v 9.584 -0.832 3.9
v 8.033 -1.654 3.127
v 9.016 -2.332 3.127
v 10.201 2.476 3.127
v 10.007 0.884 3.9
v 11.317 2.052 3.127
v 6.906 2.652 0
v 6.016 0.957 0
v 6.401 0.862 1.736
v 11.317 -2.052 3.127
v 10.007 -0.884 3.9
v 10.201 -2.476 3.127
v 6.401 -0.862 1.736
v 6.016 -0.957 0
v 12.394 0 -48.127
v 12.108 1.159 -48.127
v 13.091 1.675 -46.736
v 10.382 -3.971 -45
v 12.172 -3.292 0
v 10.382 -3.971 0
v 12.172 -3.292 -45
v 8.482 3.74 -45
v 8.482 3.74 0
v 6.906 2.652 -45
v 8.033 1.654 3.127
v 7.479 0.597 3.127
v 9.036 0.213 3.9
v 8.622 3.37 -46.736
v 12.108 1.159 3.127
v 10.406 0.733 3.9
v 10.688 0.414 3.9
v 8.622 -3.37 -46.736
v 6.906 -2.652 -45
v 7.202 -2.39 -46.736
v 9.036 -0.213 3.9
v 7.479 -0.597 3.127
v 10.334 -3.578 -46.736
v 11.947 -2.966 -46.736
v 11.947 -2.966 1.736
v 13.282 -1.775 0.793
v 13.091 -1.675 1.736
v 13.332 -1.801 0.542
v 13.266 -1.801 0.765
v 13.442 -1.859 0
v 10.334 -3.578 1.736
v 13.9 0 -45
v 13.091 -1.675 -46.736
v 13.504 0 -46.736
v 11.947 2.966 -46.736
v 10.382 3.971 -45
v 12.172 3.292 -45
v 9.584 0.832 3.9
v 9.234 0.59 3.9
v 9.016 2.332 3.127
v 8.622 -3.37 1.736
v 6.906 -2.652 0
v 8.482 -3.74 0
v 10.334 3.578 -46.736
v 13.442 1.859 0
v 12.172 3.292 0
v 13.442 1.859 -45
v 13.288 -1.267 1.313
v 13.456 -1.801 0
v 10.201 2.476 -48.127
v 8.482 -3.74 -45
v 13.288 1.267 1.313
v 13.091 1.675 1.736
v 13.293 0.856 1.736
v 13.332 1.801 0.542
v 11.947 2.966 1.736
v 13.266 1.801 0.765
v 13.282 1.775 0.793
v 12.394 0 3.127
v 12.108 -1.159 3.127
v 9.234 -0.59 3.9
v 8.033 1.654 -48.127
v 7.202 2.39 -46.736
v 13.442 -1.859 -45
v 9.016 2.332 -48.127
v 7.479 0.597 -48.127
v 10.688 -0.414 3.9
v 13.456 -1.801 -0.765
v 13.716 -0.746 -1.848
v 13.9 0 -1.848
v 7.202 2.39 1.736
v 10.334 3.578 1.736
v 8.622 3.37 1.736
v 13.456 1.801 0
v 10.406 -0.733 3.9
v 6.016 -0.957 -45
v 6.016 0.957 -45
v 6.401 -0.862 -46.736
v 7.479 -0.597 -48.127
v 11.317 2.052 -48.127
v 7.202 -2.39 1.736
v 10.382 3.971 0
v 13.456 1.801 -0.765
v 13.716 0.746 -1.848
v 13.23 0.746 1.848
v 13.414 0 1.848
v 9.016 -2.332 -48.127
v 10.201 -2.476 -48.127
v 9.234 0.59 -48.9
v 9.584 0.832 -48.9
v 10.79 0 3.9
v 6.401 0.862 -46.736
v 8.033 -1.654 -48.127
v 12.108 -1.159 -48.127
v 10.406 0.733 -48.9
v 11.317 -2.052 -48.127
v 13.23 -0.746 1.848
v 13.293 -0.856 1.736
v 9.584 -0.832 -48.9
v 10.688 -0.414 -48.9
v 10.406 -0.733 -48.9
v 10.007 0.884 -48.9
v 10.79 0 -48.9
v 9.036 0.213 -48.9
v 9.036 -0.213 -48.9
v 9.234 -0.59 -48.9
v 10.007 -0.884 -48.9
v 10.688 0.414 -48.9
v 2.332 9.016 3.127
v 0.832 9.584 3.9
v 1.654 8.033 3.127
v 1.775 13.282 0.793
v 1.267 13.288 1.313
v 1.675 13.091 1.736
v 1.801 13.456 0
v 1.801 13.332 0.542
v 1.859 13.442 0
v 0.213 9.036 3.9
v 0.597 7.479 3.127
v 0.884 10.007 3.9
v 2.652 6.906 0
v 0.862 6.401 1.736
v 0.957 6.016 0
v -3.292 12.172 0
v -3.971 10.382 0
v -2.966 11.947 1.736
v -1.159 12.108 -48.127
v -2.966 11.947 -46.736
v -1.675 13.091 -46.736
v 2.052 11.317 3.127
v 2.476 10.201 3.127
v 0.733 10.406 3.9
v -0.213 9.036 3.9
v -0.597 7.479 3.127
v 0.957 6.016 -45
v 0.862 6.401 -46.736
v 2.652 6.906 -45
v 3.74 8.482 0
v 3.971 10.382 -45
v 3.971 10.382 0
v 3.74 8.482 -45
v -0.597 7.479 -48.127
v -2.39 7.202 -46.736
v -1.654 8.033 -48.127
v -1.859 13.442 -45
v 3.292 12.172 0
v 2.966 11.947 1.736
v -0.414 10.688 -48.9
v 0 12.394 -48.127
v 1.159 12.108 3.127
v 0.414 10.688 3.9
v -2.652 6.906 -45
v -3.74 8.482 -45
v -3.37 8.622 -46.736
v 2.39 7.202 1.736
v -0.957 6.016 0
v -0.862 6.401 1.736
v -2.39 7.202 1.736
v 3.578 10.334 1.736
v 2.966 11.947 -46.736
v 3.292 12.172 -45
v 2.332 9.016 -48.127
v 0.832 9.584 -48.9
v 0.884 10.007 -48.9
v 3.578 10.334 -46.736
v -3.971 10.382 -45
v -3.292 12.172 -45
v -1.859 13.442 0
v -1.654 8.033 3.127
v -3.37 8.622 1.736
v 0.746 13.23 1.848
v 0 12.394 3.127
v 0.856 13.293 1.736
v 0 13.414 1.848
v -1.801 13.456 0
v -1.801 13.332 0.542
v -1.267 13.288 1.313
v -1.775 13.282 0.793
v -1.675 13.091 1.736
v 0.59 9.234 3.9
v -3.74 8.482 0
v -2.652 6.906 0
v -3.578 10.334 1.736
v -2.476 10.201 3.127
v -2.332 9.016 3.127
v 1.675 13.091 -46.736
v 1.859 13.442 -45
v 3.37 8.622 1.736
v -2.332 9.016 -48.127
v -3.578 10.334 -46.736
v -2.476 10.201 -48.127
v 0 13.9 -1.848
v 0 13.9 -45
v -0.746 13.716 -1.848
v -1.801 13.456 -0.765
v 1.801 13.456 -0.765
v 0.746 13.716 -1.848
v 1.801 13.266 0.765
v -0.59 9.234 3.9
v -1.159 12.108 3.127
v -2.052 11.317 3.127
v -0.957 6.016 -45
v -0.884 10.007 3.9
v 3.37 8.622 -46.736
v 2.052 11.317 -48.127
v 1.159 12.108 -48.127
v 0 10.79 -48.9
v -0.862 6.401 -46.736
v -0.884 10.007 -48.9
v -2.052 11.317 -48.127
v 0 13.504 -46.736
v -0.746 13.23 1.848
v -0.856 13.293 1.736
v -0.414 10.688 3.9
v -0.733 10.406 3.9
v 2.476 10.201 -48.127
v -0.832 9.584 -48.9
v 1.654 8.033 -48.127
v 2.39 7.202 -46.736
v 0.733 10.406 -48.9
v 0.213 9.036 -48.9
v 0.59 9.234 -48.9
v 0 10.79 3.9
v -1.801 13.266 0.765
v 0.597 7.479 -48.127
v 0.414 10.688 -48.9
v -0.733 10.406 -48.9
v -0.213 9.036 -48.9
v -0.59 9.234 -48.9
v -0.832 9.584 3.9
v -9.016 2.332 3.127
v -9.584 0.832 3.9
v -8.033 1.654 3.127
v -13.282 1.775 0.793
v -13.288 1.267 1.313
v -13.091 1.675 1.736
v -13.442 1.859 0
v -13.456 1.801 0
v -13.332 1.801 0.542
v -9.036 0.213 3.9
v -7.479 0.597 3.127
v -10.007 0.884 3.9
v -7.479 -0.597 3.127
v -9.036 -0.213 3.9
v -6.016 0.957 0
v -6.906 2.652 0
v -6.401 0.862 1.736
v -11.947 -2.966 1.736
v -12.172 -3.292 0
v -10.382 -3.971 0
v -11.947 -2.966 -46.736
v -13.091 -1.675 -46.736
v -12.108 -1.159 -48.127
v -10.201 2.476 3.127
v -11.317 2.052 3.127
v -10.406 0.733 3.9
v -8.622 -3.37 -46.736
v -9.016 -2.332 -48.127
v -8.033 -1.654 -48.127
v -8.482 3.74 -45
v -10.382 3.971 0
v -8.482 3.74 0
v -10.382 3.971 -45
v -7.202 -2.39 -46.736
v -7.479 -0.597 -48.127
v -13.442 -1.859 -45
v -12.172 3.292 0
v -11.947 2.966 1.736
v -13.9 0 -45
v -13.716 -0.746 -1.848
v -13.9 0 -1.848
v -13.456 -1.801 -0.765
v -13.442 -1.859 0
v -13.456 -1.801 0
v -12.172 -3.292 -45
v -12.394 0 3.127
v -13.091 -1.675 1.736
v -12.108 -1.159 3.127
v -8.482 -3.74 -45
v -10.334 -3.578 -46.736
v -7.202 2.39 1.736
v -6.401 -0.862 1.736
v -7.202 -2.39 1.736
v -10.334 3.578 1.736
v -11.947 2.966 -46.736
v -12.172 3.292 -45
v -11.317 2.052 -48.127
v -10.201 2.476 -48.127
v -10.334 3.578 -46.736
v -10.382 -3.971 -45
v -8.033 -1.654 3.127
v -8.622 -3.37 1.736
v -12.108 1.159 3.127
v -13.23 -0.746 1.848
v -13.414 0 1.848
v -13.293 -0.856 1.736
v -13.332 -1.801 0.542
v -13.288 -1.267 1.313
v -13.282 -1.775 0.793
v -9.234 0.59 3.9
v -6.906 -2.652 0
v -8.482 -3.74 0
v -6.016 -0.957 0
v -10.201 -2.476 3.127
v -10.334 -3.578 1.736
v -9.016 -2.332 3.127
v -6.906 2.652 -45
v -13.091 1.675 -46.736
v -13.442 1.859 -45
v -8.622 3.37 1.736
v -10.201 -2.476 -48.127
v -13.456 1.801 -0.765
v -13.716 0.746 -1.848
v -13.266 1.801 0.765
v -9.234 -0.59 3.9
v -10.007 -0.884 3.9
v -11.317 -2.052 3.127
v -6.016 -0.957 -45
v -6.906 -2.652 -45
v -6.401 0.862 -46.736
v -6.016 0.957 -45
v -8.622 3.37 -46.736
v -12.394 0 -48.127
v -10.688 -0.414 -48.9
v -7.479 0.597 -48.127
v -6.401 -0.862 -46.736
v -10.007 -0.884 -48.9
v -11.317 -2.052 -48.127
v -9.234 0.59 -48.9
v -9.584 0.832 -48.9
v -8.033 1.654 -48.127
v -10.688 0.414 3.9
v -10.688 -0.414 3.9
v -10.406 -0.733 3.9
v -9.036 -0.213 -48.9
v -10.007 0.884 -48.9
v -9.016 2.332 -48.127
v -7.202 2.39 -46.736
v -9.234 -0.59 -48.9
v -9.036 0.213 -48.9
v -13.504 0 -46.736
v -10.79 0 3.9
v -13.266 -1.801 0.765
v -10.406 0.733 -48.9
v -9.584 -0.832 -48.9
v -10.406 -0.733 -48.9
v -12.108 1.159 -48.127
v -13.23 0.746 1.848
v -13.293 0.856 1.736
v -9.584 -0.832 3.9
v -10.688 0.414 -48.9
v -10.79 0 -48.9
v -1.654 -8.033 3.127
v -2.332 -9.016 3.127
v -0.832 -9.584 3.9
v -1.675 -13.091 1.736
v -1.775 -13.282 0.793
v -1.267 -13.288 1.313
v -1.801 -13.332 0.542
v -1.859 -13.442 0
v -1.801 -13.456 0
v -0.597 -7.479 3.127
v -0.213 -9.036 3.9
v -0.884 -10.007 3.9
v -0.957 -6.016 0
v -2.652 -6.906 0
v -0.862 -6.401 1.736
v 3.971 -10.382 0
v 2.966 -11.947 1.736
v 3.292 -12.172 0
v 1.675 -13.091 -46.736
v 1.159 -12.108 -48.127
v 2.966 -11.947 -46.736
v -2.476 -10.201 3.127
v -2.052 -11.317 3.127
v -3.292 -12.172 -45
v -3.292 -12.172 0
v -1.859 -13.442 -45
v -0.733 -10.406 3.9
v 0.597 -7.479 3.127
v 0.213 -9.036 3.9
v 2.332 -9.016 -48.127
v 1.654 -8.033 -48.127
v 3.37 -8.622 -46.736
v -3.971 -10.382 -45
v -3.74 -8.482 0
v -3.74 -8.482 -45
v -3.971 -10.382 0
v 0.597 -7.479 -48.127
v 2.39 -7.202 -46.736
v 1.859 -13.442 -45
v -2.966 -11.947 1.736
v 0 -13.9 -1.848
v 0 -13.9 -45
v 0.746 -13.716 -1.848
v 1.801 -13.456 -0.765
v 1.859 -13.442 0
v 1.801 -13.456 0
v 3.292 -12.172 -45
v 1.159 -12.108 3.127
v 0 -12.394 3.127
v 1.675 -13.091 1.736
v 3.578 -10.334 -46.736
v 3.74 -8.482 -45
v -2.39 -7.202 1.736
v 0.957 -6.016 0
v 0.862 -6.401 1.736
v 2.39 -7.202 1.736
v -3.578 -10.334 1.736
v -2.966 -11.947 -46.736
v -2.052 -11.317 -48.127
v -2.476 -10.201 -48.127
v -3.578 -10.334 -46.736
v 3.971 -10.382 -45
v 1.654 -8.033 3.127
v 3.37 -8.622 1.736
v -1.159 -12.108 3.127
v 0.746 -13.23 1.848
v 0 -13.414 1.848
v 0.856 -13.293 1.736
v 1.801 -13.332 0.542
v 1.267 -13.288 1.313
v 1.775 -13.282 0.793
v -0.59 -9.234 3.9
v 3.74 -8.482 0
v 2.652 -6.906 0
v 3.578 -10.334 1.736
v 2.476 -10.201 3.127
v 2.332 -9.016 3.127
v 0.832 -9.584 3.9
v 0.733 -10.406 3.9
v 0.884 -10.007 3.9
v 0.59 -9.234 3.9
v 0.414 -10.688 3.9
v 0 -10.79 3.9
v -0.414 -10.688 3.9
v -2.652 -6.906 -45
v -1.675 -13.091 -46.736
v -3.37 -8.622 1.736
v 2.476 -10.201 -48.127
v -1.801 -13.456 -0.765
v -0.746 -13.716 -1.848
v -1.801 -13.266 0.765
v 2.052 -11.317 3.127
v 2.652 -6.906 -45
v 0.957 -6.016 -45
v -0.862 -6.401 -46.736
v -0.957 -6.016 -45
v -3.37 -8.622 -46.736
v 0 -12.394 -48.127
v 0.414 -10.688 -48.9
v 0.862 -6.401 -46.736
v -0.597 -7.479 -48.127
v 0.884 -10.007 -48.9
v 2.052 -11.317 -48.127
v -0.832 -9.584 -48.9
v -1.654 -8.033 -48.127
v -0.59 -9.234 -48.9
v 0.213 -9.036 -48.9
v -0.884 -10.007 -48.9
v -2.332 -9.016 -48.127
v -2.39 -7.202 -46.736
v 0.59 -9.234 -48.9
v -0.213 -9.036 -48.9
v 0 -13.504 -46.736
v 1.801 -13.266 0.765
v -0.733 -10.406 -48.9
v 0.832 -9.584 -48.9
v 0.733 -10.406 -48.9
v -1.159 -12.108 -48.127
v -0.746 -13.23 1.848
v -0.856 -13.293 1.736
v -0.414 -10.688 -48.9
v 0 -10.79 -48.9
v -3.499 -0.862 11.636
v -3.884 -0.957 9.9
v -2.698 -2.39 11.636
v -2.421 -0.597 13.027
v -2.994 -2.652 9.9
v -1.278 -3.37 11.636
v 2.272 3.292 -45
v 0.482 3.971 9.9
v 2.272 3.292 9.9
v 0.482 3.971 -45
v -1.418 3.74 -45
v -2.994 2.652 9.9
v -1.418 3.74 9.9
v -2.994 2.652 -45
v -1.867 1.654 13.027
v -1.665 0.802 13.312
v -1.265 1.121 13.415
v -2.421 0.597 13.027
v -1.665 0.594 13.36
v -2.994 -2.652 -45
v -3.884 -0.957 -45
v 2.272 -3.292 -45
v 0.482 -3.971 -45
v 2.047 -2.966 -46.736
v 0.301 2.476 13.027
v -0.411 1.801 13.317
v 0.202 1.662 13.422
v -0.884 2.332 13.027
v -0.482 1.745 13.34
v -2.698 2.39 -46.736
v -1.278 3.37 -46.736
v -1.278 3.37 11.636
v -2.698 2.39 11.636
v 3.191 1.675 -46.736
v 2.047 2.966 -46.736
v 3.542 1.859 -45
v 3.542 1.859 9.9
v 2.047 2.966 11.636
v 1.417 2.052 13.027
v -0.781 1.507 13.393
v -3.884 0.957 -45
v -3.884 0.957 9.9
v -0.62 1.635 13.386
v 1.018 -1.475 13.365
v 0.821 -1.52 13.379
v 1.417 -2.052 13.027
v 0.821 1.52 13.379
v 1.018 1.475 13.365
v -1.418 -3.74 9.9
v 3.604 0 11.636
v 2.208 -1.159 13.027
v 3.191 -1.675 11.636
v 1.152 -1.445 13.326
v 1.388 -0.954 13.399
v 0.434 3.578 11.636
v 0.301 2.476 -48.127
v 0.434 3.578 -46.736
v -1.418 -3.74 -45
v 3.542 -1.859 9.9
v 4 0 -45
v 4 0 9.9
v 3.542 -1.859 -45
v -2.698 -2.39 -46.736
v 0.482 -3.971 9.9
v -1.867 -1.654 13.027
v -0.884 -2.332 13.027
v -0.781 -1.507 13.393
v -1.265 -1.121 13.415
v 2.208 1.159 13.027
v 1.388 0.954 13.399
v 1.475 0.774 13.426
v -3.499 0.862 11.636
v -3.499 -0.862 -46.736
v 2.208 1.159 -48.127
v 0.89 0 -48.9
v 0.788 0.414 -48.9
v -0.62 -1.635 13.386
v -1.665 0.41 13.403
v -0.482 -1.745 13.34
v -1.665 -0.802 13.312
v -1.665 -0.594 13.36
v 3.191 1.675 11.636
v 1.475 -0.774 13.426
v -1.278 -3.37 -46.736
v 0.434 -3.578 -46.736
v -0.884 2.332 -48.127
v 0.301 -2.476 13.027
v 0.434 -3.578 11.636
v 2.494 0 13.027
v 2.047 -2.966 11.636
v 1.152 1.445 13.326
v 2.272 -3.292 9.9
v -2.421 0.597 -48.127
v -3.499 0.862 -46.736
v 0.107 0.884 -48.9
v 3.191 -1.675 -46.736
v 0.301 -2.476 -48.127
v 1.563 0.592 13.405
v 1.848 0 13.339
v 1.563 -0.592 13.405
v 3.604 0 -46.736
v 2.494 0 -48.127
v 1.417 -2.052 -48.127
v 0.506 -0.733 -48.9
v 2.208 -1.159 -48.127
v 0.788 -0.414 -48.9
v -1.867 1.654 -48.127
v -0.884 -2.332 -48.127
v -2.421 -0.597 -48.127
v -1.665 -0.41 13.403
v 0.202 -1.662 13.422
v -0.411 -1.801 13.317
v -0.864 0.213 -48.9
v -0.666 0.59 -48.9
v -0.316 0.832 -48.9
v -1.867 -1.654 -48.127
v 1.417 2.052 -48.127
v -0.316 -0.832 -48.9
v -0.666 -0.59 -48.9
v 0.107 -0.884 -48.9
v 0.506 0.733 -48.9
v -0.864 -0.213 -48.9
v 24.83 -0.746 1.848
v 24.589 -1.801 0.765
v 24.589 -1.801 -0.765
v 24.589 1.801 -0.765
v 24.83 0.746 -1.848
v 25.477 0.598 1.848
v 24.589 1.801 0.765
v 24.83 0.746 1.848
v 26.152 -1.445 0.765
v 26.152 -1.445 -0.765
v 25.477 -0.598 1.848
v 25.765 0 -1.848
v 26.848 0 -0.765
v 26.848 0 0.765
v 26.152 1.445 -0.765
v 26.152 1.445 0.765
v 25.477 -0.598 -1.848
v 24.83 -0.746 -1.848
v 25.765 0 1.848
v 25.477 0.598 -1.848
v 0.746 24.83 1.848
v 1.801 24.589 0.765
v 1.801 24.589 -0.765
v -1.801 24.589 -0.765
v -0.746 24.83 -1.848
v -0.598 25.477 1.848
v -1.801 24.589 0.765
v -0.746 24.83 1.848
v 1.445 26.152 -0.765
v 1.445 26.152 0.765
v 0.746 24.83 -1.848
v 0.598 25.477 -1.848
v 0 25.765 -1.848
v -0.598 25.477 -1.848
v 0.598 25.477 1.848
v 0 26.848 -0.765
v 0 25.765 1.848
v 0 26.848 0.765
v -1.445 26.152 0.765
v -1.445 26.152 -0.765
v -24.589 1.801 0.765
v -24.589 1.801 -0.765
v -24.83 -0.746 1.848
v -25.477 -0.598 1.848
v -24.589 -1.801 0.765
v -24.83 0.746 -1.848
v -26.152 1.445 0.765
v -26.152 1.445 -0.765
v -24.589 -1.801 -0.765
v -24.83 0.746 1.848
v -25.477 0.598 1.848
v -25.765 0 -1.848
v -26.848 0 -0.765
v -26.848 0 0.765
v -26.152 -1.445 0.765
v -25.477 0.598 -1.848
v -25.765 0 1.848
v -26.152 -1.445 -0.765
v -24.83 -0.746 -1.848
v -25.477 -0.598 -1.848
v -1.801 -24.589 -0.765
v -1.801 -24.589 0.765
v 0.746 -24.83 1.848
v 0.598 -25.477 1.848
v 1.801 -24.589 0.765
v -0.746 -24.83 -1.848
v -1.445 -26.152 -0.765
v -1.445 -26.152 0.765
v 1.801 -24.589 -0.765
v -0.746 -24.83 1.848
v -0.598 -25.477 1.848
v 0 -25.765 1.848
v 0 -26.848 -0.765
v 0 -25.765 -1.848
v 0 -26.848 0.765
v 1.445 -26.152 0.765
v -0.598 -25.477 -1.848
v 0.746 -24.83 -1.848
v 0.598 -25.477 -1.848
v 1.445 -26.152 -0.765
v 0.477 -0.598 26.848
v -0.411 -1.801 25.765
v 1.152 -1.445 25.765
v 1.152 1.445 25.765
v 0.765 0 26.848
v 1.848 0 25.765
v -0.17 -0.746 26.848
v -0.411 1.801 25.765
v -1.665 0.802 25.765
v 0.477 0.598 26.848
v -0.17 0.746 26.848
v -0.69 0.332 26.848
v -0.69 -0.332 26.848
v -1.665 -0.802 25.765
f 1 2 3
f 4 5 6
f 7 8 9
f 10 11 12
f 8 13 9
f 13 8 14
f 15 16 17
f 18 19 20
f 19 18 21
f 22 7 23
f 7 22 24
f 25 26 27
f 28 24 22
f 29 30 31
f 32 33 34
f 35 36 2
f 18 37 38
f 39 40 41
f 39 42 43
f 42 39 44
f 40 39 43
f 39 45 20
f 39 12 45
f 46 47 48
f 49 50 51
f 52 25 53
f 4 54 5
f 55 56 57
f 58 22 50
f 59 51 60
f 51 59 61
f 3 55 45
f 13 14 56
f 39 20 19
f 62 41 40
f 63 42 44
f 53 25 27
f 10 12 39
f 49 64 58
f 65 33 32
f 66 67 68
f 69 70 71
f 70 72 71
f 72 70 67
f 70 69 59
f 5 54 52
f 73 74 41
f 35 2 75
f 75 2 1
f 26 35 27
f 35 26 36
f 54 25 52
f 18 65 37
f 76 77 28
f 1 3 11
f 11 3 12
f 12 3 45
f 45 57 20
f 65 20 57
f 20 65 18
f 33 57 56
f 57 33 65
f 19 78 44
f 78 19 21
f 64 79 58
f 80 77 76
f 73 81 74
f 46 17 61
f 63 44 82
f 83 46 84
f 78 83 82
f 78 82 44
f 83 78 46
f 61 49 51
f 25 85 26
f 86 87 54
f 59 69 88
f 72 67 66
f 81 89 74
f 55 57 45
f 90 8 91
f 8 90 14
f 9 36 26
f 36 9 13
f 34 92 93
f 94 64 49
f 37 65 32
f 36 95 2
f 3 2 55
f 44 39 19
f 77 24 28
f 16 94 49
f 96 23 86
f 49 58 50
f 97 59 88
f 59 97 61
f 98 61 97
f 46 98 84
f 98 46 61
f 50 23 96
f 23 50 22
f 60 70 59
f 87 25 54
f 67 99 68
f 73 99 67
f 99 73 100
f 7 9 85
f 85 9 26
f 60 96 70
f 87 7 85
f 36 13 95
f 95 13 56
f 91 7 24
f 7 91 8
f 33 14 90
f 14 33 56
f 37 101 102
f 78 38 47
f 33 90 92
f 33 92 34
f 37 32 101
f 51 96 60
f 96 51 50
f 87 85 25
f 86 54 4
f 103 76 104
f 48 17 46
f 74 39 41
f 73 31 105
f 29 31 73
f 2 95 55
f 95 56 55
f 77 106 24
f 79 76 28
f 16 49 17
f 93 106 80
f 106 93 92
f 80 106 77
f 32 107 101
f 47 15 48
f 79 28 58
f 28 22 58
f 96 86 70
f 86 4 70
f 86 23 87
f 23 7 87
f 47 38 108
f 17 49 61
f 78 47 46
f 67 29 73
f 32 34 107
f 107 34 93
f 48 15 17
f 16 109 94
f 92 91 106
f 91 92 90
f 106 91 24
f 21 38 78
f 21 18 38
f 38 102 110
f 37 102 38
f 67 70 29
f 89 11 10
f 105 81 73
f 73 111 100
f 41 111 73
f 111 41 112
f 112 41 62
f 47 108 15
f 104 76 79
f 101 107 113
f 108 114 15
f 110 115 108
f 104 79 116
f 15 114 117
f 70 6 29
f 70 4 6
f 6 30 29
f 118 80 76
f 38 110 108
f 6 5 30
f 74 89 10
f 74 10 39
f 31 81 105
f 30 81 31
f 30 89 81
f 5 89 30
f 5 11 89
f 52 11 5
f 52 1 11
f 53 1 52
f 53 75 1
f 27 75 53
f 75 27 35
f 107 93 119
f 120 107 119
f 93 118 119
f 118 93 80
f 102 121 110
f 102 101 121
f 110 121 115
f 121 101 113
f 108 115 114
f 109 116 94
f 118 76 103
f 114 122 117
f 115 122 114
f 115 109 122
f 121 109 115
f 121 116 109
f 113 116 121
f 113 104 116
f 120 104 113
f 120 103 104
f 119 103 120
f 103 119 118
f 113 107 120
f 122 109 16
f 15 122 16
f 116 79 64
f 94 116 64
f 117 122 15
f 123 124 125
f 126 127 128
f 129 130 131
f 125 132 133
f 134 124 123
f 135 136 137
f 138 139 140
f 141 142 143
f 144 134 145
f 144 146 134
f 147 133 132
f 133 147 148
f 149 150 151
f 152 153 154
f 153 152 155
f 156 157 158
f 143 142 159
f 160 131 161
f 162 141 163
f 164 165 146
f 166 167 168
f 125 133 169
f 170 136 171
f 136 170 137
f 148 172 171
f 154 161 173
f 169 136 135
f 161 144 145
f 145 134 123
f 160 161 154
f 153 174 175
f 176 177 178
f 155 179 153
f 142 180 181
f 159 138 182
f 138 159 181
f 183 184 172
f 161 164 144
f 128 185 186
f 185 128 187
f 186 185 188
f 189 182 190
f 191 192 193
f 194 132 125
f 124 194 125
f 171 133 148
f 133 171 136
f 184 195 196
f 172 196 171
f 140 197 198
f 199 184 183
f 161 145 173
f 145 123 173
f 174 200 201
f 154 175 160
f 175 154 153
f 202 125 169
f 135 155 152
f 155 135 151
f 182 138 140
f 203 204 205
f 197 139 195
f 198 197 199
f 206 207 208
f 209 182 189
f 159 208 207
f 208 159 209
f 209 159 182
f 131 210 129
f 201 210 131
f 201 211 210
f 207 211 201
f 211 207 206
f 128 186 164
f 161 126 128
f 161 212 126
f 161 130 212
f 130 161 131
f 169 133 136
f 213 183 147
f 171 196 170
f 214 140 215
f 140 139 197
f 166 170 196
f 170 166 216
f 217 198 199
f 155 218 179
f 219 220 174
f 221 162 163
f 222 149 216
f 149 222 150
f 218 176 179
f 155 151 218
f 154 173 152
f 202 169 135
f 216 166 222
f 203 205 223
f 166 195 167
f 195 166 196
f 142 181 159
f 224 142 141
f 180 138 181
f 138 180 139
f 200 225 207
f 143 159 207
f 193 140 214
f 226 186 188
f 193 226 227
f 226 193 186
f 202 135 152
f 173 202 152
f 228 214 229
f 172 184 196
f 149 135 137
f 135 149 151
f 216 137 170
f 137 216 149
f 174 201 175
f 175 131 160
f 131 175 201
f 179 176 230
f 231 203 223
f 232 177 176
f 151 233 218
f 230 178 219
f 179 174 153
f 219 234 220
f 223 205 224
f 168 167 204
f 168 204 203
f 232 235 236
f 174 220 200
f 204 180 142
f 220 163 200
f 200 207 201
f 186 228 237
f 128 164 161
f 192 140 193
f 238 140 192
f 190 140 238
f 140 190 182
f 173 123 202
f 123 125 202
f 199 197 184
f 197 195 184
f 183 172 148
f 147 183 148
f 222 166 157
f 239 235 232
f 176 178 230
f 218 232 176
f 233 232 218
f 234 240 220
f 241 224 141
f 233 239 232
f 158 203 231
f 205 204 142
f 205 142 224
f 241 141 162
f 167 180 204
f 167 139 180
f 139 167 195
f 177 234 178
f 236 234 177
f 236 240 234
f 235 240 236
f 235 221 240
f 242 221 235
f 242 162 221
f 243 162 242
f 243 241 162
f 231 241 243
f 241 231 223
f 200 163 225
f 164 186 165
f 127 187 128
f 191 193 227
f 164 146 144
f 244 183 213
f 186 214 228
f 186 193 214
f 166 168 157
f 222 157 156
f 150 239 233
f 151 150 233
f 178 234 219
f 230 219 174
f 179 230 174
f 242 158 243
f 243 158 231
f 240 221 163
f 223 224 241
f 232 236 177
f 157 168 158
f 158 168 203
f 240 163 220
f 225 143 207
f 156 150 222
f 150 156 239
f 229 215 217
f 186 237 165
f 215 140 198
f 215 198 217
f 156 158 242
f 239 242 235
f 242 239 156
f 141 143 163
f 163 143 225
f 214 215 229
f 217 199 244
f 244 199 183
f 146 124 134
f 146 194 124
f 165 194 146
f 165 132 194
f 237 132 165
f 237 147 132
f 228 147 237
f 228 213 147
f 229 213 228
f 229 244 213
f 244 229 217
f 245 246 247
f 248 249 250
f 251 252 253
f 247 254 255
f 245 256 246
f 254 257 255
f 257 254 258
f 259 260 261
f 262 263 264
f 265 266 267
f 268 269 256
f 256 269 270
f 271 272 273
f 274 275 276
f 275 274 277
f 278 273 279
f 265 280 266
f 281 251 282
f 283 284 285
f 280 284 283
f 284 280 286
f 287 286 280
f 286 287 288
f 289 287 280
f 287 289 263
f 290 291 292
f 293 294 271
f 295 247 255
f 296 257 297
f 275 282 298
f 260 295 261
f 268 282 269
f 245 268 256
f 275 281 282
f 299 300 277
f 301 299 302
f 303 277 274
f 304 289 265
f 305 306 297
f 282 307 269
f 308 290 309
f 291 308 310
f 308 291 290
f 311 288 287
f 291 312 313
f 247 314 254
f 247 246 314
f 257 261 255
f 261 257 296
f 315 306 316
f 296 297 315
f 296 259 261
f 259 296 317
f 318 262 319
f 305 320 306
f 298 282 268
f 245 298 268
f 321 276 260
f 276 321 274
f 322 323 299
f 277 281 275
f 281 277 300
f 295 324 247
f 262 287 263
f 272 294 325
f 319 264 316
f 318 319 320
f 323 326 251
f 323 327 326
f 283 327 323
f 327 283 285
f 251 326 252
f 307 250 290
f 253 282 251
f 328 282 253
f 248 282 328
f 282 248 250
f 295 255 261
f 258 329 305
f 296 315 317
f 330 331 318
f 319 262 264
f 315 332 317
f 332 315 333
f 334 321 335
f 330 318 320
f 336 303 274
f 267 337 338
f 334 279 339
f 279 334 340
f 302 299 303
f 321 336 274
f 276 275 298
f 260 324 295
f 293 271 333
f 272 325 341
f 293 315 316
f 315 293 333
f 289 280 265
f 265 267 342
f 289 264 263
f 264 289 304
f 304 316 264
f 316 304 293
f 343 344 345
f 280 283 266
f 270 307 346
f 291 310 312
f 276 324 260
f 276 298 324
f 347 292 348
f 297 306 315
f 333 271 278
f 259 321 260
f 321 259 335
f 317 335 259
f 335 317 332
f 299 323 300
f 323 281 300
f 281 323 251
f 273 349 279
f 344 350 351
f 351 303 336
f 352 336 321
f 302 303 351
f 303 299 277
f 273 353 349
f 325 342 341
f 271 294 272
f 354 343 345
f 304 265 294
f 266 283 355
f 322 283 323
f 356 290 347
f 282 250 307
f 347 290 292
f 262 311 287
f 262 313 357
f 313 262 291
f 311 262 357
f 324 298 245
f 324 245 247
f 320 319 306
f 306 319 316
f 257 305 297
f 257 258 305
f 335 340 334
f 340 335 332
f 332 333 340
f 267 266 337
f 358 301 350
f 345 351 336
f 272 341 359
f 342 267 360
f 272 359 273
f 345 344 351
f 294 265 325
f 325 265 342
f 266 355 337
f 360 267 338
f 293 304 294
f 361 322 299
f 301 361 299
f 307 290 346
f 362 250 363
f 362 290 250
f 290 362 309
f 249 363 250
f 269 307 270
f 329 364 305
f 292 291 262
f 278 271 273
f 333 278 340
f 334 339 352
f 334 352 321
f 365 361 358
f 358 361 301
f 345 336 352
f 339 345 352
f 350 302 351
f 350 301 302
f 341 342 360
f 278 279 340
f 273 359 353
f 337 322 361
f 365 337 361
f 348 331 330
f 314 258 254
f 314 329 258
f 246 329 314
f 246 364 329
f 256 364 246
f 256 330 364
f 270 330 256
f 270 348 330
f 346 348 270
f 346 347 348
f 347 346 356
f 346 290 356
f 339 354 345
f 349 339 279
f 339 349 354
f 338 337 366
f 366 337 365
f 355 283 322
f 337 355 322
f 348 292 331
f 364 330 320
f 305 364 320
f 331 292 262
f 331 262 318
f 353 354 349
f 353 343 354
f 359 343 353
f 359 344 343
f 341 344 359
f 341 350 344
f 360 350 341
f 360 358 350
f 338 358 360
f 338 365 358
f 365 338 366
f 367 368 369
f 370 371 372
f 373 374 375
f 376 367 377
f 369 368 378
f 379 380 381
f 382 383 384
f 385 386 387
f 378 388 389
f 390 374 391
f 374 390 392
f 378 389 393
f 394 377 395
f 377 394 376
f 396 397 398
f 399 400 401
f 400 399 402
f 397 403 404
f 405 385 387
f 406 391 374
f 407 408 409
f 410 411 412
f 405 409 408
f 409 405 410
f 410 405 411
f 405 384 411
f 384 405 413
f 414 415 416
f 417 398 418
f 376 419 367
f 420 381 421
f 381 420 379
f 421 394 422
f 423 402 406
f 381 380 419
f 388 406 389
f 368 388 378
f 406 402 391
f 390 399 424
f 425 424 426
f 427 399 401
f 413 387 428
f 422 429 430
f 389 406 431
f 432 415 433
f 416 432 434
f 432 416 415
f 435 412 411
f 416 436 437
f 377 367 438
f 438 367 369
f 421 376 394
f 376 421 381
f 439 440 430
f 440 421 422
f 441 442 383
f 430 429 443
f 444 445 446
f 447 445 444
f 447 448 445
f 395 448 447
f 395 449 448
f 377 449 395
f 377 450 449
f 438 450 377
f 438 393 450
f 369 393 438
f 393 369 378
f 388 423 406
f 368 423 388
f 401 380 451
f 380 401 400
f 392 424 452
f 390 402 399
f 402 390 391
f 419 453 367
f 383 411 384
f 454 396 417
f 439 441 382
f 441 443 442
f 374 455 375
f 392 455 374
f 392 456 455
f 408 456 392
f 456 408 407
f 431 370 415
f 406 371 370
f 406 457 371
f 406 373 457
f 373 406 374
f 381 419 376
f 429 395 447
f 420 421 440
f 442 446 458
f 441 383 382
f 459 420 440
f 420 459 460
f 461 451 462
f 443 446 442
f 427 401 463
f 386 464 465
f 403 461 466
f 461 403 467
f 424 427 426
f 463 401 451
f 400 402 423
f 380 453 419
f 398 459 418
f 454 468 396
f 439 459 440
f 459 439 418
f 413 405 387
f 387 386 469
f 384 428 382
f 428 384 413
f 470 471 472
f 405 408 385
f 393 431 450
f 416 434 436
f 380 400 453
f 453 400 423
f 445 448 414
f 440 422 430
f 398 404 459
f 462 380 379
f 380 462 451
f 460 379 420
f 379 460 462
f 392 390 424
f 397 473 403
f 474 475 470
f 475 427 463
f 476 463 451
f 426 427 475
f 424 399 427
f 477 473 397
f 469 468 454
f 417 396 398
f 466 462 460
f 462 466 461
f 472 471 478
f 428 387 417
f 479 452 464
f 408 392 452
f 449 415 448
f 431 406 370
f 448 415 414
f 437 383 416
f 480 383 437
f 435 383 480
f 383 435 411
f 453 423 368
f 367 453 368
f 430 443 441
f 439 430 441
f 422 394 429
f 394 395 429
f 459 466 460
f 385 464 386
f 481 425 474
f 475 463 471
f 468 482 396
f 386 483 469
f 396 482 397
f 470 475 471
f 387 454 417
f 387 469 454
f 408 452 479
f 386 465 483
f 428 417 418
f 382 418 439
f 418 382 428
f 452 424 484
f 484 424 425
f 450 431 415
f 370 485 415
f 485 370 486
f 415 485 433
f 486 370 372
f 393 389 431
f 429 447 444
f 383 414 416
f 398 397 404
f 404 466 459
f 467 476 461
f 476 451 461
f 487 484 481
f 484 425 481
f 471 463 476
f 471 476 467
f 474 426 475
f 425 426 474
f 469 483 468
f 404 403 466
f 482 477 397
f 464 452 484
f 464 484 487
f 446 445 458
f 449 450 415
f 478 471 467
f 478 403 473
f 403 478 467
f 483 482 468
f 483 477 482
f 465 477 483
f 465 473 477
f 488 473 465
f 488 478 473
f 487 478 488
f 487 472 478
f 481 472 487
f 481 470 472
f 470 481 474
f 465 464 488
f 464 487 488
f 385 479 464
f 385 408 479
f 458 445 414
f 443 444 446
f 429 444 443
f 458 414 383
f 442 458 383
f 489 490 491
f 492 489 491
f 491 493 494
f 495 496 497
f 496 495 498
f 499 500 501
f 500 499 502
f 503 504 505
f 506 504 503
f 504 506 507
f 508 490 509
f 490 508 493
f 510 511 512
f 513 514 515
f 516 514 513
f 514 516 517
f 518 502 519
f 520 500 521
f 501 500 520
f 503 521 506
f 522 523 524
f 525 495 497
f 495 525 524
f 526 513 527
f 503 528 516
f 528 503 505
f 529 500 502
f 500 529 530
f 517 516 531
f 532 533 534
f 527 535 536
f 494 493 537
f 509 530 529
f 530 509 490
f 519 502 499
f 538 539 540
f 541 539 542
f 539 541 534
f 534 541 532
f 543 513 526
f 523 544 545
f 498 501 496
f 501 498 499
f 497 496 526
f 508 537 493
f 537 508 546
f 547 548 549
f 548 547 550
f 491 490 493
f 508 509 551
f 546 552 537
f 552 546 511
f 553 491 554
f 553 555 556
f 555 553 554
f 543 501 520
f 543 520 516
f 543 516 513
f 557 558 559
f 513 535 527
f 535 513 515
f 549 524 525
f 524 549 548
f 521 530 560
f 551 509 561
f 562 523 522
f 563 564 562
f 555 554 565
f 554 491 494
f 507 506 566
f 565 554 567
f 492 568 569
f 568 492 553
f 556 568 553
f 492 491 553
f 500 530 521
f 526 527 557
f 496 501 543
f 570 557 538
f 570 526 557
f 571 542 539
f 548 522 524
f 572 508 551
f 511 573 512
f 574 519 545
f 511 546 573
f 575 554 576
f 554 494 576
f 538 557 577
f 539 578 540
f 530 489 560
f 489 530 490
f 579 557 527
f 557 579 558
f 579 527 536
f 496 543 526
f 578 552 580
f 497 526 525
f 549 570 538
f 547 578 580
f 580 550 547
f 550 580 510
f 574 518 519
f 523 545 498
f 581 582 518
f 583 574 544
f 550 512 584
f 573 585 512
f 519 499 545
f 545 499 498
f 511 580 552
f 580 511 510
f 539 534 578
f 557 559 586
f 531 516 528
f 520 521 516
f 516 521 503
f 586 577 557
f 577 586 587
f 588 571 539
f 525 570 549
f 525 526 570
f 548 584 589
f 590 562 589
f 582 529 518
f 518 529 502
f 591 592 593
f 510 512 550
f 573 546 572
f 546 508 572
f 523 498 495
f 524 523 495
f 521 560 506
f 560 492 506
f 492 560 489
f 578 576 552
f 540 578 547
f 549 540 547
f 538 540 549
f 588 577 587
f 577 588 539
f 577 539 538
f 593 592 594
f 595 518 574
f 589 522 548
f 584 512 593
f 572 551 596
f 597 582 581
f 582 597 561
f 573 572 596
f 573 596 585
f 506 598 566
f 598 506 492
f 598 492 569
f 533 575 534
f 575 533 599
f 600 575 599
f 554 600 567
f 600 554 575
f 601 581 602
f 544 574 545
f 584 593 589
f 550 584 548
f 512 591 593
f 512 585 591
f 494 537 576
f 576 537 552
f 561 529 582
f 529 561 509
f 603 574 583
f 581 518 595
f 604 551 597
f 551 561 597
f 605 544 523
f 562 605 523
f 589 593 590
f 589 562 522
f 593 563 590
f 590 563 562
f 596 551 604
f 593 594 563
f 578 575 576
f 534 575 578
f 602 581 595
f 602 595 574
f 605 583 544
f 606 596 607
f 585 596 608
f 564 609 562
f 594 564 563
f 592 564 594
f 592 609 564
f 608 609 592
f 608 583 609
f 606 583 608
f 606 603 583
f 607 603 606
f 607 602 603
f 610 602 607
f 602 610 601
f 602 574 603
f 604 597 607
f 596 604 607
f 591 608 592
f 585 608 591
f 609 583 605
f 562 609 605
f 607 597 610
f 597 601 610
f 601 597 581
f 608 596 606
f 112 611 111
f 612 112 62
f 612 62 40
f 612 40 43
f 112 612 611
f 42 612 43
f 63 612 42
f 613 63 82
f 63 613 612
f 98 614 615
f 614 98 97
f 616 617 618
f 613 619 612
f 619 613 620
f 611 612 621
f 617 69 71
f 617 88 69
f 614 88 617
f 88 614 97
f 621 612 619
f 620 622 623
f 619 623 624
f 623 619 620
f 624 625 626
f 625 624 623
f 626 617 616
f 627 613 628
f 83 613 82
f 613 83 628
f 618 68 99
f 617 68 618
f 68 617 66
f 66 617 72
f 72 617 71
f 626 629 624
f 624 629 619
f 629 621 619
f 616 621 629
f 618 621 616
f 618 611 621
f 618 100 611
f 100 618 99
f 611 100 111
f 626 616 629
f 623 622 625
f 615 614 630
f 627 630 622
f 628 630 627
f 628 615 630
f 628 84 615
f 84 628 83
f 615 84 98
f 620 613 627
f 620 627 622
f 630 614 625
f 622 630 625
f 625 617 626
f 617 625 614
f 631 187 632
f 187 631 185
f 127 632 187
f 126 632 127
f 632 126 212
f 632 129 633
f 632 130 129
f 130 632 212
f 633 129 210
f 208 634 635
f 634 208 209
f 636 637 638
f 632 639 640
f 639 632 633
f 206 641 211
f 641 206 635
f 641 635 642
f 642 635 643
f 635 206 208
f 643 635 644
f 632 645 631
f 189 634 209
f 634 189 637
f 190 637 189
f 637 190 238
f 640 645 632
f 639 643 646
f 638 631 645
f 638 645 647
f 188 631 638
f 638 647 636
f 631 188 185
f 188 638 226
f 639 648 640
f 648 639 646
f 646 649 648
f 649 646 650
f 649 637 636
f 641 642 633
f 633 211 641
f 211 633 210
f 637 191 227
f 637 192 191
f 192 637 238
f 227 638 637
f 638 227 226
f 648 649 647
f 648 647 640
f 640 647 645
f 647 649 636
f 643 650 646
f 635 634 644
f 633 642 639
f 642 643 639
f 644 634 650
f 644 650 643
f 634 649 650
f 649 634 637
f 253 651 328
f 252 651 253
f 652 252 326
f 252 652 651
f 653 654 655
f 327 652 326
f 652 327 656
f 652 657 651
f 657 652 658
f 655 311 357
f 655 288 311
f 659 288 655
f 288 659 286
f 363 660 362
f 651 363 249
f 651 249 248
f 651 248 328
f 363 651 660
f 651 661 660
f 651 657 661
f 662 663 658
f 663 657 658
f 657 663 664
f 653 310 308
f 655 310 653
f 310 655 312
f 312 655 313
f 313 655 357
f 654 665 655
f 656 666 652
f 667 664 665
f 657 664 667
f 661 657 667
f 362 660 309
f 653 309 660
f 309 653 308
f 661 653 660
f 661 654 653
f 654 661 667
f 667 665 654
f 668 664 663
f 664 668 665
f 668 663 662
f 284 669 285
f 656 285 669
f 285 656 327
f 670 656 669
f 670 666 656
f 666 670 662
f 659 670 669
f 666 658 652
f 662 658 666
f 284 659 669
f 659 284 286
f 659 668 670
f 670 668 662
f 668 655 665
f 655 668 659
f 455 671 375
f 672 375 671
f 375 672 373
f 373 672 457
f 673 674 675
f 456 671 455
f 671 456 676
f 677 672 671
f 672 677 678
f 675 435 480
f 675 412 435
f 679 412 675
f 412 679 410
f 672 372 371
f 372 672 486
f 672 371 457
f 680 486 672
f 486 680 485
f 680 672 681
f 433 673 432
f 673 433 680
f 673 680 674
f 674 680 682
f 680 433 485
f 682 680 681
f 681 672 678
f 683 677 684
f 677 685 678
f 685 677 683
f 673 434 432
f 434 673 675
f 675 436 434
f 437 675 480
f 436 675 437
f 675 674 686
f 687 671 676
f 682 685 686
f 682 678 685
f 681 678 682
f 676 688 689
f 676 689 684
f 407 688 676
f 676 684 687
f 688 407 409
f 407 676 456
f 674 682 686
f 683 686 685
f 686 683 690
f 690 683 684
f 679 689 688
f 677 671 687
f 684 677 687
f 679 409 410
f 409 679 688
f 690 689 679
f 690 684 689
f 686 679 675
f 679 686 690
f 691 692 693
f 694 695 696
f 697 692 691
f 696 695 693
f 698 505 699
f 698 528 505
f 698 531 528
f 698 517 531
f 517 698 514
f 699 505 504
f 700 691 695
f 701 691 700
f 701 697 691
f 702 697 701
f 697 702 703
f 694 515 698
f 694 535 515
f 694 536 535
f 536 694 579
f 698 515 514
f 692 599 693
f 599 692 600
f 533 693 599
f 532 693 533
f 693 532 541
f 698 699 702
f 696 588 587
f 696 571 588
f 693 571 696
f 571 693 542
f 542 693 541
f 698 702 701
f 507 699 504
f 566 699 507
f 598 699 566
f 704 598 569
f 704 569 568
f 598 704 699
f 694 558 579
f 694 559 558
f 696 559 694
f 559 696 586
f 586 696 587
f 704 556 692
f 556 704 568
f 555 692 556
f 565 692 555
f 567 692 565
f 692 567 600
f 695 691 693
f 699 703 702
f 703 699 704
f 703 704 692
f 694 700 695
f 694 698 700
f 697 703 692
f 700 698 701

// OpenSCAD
module duct_segment(p1, p2, r) {
	hull() {
		translate(p1)sphere(r=r,center=true);
		translate(p2)sphere(r=r,center=true);
	}
}

// Units in mm
r=15; // Radius of the sphere
r_ducts = 4; // Radius of the internal ductwork
r_holes = 2; // Radius of the holes to be drilled
h=50-r; // Overall height of the pitot tube

module outer_shell() {
	hull() {
	sphere(r=r,center=true);
	rotate(a=[0,180,0]) {cylinder(r=r,h=h);}
	}
}

r_join=r * .66; // The Radius where the drilled holes join with the ducts


module holes() {
	union() {
		duct_segment([0,0,r_join],[0,0,r+10],r_holes);
		for(i=[0:90:360])	
		{
			rotate(i,[0,0,1]) 
			{
				duct_segment([r_join,0,0],[r+10,0,0],r_holes);
			}
		}
	}
}

module ducts() {
	union() {
		duct_segment([0,0,r_join],[0,0,-h-10],r_ducts);
		for(i=[0:90:360])	
		{
			rotate(i,[0,0,1]) 
			{
				duct_segment([r_join,0,0],[r_join,0,-h-10],r_ducts);
			}
		}
	}
}

/*holes();*/
difference() {
	% outer_shell();
	union() {
	ducts();
    # holes();
	}
}
